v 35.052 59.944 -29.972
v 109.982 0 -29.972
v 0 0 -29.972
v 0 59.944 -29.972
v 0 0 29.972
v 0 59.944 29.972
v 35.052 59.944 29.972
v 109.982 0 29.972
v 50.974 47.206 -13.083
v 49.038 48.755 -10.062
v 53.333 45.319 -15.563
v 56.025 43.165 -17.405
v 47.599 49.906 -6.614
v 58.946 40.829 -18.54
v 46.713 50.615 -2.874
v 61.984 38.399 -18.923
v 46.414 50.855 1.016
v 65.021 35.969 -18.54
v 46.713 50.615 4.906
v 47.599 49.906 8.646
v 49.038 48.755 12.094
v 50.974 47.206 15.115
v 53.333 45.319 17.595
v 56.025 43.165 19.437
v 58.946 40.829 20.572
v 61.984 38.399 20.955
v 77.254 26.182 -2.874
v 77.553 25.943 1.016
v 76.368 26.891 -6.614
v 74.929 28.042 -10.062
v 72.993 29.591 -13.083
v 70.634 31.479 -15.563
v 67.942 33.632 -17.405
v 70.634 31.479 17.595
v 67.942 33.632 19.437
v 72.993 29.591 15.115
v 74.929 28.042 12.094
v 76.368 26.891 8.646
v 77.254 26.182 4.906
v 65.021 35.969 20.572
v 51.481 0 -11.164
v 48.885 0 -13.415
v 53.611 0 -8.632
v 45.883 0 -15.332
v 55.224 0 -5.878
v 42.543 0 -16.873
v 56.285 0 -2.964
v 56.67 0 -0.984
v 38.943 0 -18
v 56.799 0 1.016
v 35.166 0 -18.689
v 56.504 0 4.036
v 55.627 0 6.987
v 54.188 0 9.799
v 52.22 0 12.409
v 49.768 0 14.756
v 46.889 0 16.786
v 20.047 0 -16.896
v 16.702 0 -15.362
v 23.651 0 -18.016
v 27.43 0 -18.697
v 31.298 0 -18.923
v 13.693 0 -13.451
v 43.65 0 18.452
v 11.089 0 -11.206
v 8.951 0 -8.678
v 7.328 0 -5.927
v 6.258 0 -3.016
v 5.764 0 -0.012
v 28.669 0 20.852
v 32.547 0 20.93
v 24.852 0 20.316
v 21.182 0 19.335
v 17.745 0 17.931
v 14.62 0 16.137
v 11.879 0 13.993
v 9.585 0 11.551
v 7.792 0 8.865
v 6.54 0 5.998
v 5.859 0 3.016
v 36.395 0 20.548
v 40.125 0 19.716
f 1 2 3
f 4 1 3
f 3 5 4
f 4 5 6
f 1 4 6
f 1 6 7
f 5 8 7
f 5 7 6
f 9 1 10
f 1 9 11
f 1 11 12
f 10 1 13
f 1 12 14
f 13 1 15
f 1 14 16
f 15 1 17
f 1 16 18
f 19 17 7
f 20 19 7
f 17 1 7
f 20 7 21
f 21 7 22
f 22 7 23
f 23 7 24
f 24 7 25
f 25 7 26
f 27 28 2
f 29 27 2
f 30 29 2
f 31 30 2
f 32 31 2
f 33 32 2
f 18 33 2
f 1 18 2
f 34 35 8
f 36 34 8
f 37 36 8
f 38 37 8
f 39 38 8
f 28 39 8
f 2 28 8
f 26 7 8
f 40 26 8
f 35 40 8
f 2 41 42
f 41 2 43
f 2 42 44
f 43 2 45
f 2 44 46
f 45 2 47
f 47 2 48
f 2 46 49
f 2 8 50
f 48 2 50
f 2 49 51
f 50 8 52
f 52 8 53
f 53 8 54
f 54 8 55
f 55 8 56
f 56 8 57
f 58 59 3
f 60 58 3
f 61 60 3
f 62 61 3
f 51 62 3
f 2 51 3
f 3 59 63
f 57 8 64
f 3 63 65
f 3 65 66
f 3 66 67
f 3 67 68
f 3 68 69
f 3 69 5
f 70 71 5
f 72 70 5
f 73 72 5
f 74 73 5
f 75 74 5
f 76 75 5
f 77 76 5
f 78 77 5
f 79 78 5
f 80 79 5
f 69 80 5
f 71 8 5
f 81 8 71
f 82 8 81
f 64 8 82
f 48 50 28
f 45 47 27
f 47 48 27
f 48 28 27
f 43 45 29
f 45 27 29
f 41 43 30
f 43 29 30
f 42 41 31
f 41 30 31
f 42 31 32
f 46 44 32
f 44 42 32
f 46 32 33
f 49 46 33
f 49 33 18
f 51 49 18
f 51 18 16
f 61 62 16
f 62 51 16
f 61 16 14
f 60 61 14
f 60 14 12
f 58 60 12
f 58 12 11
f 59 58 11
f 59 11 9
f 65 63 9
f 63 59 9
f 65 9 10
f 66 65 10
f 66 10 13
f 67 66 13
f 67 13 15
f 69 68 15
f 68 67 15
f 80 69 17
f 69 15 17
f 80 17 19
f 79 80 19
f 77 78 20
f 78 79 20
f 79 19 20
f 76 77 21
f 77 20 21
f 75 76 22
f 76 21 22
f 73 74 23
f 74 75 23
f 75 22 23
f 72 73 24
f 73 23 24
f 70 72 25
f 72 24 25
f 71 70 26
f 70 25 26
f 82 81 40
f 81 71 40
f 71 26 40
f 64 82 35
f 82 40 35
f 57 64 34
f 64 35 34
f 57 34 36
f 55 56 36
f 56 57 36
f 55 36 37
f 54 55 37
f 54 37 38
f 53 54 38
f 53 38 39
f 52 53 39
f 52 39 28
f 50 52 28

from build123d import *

# Parameters (mm, degrees)
BOSS_EXTRUDE1_DEPTH = 29.972
CUT_EXTRUDE1_REACH  = 70.705
SKETCH2_R           = 19.939


with BuildPart() as part:
    # Sketch1 → Boss-Extrude1 (new body, symmetric)
    with BuildSketch(Plane.XY):
        Polygon((0, 0), (0, 59.944), (35.052, 59.944), (109.982, 0), align=None)
    extrude(amount=BOSS_EXTRUDE1_DEPTH, both=True)

    # Cut-Extrude1: up to this face of the body (flat: up to its plane)
    cut_extrude1_end = Plane(part.part.faces().sort_by_distance((54.991, 0, 0))[0])
    # Sketch2 → Cut-Extrude1 (cut, up to the picked face)
    with BuildSketch(Plane(origin=(42.919804878, 53.649756098, 0), x_dir=(0.780868809, -0.624695048, 0), z_dir=(0.624695048, 0.780868809, 0)), mode=Mode.PRIVATE) as cut_extrude1_sk1:
        with Locations((24.4135134, -1.016)):
            Circle(SKETCH2_R)
    cut_extrude1_tool1 = split(extrude(cut_extrude1_sk1.sketch, amount=-CUT_EXTRUDE1_REACH, mode=Mode.PRIVATE), bisect_by=cut_extrude1_end, keep=Keep.BOTH, mode=Mode.PRIVATE)
    add(cut_extrude1_tool1.solids().sort_by_distance((61.983556, 38.398755, 1.016))[0], mode=Mode.SUBTRACT)


solid = part.part
